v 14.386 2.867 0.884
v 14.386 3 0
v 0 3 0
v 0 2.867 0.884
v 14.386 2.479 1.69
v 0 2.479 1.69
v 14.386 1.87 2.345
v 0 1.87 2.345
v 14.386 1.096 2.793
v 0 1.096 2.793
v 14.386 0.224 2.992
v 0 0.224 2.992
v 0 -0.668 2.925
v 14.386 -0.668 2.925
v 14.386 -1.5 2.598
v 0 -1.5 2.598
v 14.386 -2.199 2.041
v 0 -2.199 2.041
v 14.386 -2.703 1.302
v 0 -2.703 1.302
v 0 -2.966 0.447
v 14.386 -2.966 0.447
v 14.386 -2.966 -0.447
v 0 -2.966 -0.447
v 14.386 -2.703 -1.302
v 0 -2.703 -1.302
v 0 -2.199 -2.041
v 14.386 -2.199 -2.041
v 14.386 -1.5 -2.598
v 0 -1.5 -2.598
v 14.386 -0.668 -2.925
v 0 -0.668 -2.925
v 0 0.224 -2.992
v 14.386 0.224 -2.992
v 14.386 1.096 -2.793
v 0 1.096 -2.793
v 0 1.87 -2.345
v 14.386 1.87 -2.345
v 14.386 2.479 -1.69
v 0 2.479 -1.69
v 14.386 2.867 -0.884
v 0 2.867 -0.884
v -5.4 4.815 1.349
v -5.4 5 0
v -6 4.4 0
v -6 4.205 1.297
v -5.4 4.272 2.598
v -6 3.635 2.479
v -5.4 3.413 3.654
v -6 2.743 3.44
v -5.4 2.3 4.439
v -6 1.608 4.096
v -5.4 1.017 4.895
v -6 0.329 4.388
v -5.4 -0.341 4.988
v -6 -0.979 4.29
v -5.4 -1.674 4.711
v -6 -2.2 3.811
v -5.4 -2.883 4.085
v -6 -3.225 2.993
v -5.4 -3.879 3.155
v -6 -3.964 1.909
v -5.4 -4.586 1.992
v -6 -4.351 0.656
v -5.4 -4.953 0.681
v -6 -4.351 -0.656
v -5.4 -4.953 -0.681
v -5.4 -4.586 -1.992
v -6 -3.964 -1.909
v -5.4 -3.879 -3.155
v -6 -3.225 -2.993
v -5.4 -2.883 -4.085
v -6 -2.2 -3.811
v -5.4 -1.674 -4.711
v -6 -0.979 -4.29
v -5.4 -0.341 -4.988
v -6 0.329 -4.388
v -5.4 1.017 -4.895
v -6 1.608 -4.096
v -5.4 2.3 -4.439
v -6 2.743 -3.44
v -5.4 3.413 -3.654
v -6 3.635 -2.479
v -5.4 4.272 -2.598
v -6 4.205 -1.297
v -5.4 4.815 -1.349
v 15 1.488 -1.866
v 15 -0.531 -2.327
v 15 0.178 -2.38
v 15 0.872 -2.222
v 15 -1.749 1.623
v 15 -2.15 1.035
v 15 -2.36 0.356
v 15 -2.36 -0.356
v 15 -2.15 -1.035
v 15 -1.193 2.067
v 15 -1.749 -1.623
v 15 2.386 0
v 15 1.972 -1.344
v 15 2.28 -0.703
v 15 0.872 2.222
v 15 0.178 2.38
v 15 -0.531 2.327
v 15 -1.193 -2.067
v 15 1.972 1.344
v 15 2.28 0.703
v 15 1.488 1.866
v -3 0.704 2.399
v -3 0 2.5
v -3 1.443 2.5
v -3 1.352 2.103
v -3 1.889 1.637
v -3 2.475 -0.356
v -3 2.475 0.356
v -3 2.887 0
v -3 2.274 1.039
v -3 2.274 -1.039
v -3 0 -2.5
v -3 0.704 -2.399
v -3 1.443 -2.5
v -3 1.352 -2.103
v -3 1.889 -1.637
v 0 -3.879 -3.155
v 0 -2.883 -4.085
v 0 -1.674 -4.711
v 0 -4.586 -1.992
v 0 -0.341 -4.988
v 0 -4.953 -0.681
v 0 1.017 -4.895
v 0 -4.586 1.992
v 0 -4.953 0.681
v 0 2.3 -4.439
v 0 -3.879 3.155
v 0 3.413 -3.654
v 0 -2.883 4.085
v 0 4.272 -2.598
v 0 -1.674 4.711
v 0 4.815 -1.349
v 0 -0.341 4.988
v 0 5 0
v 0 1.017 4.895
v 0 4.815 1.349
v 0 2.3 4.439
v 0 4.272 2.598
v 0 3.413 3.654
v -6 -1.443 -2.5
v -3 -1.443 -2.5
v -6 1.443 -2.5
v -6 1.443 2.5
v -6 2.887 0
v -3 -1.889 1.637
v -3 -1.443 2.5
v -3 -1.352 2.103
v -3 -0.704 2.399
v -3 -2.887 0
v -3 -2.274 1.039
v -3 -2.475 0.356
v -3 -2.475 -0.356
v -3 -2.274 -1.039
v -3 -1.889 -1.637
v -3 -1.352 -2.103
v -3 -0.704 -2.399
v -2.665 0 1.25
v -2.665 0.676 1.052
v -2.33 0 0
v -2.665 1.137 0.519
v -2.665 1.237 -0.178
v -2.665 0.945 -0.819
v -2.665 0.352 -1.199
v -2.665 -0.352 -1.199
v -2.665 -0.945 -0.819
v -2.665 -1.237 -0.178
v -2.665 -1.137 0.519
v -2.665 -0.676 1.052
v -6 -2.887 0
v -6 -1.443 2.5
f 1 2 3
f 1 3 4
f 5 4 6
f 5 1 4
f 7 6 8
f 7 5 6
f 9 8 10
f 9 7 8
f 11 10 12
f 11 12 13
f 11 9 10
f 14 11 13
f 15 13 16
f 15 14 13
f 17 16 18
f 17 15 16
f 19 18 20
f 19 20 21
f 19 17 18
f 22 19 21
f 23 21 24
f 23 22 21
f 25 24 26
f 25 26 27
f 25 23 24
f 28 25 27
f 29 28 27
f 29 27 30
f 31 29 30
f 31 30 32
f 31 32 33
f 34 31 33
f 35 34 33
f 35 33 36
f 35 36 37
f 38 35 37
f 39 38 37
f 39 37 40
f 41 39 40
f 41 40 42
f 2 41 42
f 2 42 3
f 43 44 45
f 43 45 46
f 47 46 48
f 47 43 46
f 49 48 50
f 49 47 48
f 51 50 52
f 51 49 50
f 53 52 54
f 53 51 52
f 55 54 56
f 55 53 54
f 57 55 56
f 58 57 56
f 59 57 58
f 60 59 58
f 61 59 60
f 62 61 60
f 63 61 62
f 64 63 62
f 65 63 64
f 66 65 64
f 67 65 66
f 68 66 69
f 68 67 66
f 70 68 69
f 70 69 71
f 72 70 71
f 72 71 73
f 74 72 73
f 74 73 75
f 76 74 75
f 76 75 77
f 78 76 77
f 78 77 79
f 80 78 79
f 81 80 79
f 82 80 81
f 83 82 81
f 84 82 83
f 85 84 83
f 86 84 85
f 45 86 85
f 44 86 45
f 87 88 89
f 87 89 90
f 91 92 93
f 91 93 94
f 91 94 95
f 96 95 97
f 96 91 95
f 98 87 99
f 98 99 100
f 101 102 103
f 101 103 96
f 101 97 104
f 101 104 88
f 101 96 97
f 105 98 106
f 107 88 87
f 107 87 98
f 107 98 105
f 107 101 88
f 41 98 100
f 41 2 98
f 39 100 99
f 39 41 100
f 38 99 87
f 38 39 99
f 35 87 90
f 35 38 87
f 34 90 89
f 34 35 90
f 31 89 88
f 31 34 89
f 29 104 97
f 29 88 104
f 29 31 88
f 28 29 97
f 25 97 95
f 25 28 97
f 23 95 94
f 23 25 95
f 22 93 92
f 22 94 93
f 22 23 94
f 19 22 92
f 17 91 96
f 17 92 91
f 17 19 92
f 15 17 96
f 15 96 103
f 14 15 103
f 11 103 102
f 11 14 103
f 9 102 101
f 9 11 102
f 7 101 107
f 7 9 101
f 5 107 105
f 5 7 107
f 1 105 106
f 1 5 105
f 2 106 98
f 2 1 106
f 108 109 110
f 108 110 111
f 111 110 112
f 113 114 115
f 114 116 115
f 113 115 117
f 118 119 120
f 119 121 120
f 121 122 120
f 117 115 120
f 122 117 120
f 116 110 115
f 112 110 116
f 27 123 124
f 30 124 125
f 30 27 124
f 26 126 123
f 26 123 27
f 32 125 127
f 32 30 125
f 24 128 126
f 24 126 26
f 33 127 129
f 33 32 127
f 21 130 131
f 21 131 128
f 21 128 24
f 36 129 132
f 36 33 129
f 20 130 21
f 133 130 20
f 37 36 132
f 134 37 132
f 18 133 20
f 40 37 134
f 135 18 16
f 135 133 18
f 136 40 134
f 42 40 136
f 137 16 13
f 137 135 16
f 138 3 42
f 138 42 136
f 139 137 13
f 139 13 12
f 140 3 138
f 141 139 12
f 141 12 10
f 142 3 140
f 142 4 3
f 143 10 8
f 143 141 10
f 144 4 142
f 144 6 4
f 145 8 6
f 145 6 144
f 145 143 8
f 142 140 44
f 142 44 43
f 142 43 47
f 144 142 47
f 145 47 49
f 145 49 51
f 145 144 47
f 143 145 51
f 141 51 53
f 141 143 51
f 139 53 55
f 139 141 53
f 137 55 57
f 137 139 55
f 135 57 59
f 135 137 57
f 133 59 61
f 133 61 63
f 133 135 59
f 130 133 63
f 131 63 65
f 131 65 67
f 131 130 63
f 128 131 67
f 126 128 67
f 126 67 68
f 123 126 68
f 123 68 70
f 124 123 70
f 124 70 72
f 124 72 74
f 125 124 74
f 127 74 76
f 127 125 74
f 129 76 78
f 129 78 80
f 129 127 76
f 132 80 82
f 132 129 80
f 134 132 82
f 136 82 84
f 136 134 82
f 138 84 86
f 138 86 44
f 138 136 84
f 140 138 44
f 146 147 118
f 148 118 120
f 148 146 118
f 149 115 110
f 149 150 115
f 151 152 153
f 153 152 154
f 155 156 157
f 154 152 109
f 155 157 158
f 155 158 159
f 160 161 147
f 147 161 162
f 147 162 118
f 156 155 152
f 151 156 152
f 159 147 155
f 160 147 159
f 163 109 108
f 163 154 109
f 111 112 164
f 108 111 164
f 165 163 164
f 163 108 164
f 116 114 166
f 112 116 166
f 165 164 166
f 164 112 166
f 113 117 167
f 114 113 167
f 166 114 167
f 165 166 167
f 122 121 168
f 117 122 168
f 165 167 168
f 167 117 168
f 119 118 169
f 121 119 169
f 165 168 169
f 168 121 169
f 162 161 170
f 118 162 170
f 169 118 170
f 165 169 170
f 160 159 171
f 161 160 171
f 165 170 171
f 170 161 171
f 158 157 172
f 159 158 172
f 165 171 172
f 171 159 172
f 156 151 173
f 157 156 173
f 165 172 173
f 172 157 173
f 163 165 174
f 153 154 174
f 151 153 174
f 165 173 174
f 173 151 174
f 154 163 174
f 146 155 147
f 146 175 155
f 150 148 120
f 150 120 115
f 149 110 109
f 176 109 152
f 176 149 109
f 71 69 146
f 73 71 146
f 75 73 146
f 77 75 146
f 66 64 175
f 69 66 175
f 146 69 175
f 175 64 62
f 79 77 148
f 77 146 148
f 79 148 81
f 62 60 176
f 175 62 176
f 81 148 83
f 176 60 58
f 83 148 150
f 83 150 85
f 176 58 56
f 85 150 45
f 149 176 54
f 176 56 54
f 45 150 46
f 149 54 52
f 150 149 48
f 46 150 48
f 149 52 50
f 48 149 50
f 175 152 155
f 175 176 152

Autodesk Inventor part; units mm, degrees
sketch "Sketch_1" plane through (0, 0, 0) normal (0, 0, 1) x (1, 0, 0)
  line L0 (15, 0) -> (-6, 0)
  line L1 (-6, 0) -> (-6, 4.4)
  line L2 (-6, 4.4) -> (-5.4, 5)
  line L3 (-5.4, 5) -> (0, 5)
  line L4 (0, 5) -> (0, 3)
  line L5 (0, 3) -> (14.3865, 3)
  line L6 (14.3865, 3) -> (15, 2.3865)
  line L7 (15, 2.3865) -> (15, 0)
  line L8 (15, 0) -> (-6, 0)
revolve "Revolution1" add sketch "Sketch_1" angle 360 about axis through (15, 0, 0) along (1, 0, 0)
thread "Thread1" size "M6x1" class "6g" standard "ISO Metric profile" length 13.3865
sketch "Sketch2" plane through (-6, 0, 0) normal (-1, 0, 0) x (0, 0, 1)
  point P0 (0, 0)
hole "Hole1" at (-6, 0, 0) direction (1, 0, 0) diameter 5 depth 3 tip angle 150
sketch "Sketch_3" plane through (-6, 0, 0) normal (1, 0, 0) x (0, 0, -1)
  line L0 (-2.5, -1.4434) -> (0, -2.8868)
  line L1 (0, -2.8868) -> (2.5, -1.4434)
  line L2 (2.5, -1.4434) -> (2.5, 1.4434)
  line L3 (2.5, 1.4434) -> (0, 2.8868)
  line L4 (0, 2.8868) -> (-2.5, 1.4434)
  line L5 (-2.5, 1.4434) -> (-2.5, -1.4434)
extrude "Extrusion1" cut sketch "Sketch_3" along normal blind 3
ref_plane "to_cp_XY" through (0, 0, 0) normal (1, 0, 0) x (0, 0, -1)
ref_plane "to_cp_YZ" through (0, 0, 0) normal (0, 0, -1) x (0, 1, 0)
ref_plane "to_cp_ZX" through (0, 0, 0) normal (0, 1, 0) x (1, 0, 0)
properties part number "BOLT6-15"
